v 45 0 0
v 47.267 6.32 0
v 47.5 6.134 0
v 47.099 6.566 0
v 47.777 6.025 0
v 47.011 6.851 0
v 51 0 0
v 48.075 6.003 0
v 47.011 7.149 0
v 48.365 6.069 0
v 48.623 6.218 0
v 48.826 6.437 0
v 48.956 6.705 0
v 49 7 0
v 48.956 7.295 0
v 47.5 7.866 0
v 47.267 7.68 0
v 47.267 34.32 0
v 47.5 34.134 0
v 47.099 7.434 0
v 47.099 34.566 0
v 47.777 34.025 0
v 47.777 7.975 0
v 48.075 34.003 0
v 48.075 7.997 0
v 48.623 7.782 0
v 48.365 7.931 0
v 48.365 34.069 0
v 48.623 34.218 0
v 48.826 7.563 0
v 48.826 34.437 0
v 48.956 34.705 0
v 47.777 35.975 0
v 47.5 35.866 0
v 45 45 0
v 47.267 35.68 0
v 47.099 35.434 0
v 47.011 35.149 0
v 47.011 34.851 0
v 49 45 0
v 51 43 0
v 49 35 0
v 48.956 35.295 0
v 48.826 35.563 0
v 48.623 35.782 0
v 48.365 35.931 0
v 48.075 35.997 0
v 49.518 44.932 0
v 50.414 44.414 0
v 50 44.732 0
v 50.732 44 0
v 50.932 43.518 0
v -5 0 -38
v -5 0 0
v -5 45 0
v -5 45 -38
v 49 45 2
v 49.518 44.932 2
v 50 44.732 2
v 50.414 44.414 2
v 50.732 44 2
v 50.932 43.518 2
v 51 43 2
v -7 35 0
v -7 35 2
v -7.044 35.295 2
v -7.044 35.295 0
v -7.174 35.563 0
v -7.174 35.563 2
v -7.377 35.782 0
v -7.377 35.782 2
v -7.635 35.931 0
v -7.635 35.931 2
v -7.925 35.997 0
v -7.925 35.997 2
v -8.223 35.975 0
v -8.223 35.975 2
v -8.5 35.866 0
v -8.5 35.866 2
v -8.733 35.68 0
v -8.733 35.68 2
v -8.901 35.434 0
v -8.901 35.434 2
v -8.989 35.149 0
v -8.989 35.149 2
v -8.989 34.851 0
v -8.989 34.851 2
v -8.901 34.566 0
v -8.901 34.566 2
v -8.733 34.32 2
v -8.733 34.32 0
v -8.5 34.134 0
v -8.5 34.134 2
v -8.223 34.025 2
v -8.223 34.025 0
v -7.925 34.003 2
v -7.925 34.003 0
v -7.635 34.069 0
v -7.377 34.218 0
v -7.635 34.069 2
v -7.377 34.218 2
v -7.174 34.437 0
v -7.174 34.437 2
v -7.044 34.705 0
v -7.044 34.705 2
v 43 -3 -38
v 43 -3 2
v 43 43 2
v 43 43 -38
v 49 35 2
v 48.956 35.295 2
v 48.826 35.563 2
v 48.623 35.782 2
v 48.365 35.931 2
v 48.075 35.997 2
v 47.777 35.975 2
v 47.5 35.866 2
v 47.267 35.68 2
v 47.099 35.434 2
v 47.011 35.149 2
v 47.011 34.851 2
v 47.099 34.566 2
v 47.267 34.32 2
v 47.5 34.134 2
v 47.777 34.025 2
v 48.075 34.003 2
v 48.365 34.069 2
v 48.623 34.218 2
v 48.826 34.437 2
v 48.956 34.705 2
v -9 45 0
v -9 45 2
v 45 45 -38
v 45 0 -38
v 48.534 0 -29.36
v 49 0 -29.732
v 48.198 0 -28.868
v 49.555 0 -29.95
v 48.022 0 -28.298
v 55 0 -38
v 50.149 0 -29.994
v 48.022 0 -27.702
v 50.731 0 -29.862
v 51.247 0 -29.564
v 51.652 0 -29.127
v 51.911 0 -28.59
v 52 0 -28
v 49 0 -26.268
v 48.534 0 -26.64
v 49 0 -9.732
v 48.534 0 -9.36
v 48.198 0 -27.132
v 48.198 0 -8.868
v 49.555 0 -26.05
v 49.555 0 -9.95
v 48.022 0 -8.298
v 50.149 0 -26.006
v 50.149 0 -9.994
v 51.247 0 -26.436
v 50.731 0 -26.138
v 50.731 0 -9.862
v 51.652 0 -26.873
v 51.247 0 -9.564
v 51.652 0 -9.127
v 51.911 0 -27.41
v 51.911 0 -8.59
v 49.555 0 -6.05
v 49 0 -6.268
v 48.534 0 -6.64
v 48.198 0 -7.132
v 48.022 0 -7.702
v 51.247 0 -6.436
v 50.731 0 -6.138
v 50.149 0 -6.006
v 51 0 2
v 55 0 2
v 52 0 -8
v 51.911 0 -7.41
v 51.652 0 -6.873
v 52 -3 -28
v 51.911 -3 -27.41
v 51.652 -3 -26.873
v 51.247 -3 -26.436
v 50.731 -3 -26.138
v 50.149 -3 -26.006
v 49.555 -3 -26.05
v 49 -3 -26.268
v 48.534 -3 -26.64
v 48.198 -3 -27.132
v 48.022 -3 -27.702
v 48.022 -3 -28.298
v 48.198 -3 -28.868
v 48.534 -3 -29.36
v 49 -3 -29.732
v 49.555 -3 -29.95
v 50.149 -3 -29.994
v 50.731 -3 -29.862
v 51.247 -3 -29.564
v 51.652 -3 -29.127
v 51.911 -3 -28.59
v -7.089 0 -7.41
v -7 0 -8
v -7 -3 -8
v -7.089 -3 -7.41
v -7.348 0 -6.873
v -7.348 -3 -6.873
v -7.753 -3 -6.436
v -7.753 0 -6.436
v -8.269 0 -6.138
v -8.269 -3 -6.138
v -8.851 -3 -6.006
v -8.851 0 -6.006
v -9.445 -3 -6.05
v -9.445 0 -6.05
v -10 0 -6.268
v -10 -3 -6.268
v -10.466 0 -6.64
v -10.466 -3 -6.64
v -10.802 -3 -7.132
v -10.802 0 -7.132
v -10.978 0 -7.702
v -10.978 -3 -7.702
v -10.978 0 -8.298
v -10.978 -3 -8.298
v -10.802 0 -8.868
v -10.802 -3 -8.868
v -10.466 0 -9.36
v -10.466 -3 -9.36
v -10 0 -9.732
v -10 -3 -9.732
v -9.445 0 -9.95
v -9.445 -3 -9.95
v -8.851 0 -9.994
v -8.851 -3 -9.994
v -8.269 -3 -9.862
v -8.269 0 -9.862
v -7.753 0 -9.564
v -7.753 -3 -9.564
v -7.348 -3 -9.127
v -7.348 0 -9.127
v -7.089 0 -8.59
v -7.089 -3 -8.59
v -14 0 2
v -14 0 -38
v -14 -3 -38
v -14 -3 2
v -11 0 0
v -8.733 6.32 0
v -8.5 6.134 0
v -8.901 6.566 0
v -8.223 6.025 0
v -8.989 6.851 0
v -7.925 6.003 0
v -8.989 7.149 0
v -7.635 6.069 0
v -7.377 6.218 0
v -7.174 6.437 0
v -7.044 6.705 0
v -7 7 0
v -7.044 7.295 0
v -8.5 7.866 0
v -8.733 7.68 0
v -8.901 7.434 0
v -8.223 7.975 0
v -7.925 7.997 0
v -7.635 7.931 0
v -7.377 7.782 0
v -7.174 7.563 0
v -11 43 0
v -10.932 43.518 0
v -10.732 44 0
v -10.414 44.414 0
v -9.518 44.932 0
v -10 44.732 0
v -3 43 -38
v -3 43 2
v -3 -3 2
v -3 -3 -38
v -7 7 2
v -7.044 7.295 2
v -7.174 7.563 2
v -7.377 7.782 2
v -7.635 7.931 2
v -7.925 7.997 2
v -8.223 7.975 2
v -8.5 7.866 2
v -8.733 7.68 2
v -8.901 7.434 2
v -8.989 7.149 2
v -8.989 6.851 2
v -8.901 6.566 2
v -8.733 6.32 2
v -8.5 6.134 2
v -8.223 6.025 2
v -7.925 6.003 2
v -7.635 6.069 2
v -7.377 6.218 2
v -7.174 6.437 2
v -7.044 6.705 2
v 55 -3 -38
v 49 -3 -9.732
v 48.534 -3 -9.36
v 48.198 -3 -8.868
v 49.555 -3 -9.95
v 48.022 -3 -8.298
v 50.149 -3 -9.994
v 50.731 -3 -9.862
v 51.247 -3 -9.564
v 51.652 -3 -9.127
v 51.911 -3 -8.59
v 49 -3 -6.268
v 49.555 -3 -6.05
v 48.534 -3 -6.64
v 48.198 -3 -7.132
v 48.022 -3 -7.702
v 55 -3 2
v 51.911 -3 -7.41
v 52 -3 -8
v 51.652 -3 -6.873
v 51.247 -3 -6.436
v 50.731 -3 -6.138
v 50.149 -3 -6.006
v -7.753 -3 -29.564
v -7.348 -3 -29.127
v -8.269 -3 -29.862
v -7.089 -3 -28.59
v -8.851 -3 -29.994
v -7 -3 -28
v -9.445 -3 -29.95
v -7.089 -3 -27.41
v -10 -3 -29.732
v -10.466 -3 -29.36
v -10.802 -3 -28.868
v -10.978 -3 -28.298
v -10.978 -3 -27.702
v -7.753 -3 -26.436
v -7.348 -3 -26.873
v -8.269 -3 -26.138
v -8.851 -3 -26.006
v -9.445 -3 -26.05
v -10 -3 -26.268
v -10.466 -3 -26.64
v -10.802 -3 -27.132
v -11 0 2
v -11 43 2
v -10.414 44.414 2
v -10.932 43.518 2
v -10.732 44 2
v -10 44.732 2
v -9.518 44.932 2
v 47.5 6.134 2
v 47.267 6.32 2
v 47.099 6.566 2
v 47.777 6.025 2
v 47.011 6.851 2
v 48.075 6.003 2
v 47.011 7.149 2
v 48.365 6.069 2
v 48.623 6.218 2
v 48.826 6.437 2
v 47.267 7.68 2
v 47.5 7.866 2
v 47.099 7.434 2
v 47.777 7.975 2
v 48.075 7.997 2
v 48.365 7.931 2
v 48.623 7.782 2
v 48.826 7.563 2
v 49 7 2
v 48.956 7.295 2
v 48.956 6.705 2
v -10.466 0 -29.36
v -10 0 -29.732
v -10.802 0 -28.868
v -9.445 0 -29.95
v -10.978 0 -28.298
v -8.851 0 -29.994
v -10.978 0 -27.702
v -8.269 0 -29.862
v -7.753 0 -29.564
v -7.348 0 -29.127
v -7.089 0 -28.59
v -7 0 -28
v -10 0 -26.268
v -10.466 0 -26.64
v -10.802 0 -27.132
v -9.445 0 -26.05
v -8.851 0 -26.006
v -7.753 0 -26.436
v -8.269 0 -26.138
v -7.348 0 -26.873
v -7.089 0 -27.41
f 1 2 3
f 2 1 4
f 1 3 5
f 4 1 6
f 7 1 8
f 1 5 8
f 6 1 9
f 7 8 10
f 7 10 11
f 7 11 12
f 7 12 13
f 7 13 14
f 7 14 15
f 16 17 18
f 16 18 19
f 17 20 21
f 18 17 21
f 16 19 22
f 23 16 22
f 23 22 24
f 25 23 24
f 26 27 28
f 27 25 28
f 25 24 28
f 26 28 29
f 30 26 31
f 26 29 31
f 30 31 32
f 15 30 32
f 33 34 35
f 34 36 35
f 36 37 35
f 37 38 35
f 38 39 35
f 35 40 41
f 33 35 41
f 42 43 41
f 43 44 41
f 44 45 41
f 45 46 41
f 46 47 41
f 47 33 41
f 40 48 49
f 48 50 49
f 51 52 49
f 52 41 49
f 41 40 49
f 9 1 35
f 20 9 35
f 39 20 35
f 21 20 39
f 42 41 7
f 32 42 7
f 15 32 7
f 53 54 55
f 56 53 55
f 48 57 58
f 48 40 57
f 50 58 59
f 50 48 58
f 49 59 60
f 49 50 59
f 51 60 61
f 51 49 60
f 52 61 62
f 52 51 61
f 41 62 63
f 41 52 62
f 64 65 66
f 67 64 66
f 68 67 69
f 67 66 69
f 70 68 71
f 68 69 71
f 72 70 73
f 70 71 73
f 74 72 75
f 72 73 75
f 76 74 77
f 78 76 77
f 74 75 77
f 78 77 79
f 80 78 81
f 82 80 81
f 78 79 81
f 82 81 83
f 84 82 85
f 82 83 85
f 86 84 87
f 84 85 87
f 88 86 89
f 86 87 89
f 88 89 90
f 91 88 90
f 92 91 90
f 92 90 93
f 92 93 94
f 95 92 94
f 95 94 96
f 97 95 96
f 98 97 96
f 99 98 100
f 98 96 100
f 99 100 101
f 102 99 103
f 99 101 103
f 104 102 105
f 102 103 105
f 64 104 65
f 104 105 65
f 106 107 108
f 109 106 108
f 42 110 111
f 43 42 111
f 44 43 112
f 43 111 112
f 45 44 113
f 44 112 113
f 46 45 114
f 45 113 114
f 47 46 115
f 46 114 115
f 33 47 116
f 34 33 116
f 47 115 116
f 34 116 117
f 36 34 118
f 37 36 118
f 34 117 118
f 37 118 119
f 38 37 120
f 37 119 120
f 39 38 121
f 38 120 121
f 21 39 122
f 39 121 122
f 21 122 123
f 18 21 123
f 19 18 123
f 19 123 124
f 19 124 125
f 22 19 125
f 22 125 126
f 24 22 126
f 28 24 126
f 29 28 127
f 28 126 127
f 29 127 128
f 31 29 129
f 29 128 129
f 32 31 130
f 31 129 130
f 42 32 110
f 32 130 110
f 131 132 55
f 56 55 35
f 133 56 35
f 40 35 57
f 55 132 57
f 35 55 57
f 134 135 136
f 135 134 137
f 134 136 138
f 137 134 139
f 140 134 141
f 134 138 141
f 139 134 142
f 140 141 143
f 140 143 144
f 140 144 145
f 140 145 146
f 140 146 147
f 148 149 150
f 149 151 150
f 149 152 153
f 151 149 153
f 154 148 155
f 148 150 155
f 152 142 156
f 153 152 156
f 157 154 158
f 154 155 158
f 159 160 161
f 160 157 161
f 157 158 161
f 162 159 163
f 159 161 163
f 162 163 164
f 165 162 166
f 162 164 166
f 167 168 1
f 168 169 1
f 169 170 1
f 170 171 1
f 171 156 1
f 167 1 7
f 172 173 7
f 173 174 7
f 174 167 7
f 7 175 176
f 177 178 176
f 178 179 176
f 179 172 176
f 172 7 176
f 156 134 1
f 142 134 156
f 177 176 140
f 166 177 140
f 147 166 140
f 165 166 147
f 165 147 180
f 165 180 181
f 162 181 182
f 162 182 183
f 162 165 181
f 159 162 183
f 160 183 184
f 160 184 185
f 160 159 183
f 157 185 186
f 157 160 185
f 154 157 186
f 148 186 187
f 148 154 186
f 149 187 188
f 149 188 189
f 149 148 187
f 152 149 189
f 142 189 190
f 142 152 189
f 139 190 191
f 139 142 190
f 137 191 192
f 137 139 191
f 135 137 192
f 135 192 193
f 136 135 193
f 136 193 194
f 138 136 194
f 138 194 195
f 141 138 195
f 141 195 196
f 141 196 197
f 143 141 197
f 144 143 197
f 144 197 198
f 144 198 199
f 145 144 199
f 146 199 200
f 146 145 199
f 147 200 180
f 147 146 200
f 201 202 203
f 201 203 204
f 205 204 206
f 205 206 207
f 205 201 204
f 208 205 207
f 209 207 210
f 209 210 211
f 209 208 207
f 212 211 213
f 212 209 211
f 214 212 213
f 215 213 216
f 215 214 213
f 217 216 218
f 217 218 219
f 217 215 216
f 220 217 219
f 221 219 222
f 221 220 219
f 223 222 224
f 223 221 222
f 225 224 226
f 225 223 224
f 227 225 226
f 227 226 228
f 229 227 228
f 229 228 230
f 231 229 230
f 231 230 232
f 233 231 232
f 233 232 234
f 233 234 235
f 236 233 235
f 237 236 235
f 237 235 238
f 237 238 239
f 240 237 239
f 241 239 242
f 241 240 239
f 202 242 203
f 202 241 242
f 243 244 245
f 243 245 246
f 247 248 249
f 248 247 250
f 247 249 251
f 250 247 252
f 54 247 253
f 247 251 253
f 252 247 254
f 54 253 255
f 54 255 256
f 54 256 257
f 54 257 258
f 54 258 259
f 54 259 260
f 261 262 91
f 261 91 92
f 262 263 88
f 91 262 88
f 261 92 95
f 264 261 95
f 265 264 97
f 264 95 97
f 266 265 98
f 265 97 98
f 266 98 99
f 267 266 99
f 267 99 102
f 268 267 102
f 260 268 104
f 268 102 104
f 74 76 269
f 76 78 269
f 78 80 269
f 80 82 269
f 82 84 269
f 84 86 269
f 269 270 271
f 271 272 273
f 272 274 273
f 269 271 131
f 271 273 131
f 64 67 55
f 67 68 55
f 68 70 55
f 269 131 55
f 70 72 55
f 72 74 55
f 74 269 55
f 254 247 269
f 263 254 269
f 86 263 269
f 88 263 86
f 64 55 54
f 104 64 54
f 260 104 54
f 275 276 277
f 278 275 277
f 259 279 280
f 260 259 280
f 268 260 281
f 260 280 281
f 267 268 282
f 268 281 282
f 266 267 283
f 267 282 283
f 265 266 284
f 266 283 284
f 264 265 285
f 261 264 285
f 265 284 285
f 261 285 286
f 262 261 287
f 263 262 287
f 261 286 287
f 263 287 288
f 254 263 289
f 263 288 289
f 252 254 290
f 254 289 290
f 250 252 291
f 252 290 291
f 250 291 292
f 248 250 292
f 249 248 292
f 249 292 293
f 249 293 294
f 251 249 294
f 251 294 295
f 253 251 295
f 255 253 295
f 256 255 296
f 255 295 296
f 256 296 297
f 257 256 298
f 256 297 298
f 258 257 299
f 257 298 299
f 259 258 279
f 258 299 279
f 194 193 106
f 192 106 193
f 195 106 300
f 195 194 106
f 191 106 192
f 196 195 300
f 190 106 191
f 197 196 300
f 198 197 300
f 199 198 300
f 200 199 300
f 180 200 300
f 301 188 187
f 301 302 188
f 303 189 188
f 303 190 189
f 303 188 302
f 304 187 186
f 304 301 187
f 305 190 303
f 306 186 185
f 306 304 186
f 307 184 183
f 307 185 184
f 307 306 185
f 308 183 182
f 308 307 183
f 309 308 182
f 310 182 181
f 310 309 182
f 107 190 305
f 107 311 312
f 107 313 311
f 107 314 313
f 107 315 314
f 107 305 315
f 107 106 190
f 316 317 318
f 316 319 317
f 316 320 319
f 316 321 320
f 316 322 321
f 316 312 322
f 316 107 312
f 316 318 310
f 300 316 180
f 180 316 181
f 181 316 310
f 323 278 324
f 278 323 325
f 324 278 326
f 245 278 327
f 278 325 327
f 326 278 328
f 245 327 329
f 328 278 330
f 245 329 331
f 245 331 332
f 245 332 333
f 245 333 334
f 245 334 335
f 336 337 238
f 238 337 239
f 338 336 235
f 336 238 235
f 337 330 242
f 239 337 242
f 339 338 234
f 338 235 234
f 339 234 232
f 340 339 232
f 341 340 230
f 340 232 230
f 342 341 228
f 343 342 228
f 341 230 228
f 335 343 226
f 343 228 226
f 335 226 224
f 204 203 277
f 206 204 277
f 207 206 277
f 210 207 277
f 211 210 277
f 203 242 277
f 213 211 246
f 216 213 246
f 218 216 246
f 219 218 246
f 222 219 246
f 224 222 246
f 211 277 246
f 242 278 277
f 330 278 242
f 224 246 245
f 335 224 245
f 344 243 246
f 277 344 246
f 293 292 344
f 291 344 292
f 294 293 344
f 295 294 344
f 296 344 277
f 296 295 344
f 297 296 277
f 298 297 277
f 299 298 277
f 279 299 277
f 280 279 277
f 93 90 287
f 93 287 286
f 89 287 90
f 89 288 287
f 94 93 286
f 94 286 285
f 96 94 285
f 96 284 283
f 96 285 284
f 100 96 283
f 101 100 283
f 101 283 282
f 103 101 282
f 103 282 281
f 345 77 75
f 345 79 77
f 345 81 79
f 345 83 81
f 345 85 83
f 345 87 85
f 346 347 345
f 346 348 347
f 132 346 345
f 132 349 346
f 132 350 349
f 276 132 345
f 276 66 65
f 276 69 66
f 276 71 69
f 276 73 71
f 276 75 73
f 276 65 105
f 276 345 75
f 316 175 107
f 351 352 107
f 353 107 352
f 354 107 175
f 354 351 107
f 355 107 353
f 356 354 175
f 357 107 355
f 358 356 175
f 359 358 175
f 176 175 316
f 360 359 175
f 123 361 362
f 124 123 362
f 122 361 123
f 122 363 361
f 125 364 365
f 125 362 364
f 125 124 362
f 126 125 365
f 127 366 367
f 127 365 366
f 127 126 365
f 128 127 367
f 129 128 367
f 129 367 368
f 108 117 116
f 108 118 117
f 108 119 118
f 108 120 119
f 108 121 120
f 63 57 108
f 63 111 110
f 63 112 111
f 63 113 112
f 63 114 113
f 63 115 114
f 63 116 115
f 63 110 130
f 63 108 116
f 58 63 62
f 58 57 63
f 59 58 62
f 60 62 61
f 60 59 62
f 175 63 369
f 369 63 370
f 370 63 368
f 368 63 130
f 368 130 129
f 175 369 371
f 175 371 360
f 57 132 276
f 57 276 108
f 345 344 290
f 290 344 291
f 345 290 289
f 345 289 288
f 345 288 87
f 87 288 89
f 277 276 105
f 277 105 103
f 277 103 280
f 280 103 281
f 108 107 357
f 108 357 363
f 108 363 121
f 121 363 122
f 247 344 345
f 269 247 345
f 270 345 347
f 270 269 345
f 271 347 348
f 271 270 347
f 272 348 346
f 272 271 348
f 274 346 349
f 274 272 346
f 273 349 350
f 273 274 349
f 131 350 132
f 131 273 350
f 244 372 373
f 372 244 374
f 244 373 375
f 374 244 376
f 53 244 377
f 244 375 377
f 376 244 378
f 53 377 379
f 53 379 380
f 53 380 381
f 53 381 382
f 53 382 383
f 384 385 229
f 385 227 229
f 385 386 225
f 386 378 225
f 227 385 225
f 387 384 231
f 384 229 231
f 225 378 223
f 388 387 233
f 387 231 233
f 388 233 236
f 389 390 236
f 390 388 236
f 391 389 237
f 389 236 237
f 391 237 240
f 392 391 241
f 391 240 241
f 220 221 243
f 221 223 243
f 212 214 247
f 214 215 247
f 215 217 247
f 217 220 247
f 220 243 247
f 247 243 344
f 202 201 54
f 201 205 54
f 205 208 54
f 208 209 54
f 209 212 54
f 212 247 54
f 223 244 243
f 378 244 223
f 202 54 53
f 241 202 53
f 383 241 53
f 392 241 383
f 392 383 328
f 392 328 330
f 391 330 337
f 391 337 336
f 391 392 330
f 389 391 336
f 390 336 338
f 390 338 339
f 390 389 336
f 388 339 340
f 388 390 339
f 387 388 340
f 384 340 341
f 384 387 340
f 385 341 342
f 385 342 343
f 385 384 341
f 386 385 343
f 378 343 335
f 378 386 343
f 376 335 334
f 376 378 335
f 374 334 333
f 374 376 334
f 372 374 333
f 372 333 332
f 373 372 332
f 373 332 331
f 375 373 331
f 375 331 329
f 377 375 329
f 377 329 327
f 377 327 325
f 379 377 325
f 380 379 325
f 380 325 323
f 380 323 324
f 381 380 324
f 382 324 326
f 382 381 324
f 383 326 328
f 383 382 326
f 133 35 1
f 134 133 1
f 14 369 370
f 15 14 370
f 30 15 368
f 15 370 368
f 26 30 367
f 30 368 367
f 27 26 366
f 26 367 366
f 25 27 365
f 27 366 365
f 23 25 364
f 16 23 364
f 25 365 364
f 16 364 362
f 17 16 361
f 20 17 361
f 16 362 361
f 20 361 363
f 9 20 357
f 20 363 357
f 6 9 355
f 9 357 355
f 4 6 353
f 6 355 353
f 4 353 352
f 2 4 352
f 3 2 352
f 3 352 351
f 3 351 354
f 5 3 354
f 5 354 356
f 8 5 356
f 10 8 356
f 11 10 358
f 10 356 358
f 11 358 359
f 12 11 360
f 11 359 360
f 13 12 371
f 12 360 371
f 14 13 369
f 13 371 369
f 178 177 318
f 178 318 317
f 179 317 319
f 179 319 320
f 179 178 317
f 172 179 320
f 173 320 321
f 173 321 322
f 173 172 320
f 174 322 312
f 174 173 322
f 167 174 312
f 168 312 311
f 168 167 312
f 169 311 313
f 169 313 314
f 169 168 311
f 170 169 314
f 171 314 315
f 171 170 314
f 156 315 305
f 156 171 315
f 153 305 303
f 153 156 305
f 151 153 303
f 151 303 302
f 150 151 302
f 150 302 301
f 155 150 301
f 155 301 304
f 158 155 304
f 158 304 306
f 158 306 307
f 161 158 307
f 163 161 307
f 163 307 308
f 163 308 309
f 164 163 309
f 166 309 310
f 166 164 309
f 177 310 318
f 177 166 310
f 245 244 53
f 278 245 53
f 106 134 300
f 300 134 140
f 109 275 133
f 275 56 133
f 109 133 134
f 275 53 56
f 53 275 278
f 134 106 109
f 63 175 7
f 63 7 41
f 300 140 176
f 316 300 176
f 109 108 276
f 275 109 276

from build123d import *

# Parameters (mm, degrees)
SKETCH012_W      = 10
SKETCH012_H      = 40
SKETCH012_R      = 2
EXTRUDE010_DEPTH = 3
EXTRUDE008_DEPTH = 40
SKETCH011_W      = 6
SKETCH011_H      = 48
SKETCH011_R      = 1
EXTRUDE009_DEPTH = 2
FILLET002_R      = 2


with BuildPart() as extrude010:
    # Sketch012 → Extrude010 (new body)
    with BuildSketch(Plane.XZ):
        with Locations((-9, -18)):
            Rectangle(SKETCH012_W, SKETCH012_H)
        with Locations((-9, -8)):
            Circle(SKETCH012_R, mode=Mode.SUBTRACT)
        with Locations((-9, -28)):
            Circle(SKETCH012_R, mode=Mode.SUBTRACT)
        with Locations((50, -18)):
            Rectangle(SKETCH012_W, SKETCH012_H)
        with Locations((50, -8)):
            Circle(SKETCH012_R, mode=Mode.SUBTRACT)
        with Locations((50, -28)):
            Circle(SKETCH012_R, mode=Mode.SUBTRACT)
    extrude(amount=EXTRUDE010_DEPTH)


with BuildPart() as extrude008:
    # Sketch007 → Extrude008 (new body)
    with BuildSketch(Plane.XY.offset(2)):
        Polygon((43, -3), (43, 43), (-3, 43), (-3, -3), (-5, -3), (-5, 45), (45, 45), (45, -3), align=None)
    extrude(amount=-EXTRUDE008_DEPTH)


with BuildPart() as fusion006:
    # Sketch011 → Extrude009 (new body)
    with BuildSketch(Plane.XY.offset(2)):
        with Locations((48, 21)):
            Rectangle(SKETCH011_W, SKETCH011_H)
        with Locations((48, 35)):
            Circle(SKETCH011_R, mode=Mode.SUBTRACT)
        with Locations((48, 7)):
            Circle(SKETCH011_R, mode=Mode.SUBTRACT)
        with Locations((-8, 21)):
            Rectangle(SKETCH011_W, SKETCH011_H)
        with Locations((-8, 7)):
            Circle(SKETCH011_R, mode=Mode.SUBTRACT)
        with Locations((-8, 35)):
            Circle(SKETCH011_R, mode=Mode.SUBTRACT)
    extrude(amount=-EXTRUDE009_DEPTH)

    # Fillet002
    fillet002_edges = [fusion006.edges().sort_by_distance(p)[0] for p in [
        (-11, 45, 1),
        (51, 45, 1),
    ]]
    fillet(fillet002_edges, radius=FILLET002_R)

    # Fusion005: union Extrude008
    add(extrude008.part)

    # Fusion006: union Extrude010
    add(extrude010.part)


solid = fusion006.part
